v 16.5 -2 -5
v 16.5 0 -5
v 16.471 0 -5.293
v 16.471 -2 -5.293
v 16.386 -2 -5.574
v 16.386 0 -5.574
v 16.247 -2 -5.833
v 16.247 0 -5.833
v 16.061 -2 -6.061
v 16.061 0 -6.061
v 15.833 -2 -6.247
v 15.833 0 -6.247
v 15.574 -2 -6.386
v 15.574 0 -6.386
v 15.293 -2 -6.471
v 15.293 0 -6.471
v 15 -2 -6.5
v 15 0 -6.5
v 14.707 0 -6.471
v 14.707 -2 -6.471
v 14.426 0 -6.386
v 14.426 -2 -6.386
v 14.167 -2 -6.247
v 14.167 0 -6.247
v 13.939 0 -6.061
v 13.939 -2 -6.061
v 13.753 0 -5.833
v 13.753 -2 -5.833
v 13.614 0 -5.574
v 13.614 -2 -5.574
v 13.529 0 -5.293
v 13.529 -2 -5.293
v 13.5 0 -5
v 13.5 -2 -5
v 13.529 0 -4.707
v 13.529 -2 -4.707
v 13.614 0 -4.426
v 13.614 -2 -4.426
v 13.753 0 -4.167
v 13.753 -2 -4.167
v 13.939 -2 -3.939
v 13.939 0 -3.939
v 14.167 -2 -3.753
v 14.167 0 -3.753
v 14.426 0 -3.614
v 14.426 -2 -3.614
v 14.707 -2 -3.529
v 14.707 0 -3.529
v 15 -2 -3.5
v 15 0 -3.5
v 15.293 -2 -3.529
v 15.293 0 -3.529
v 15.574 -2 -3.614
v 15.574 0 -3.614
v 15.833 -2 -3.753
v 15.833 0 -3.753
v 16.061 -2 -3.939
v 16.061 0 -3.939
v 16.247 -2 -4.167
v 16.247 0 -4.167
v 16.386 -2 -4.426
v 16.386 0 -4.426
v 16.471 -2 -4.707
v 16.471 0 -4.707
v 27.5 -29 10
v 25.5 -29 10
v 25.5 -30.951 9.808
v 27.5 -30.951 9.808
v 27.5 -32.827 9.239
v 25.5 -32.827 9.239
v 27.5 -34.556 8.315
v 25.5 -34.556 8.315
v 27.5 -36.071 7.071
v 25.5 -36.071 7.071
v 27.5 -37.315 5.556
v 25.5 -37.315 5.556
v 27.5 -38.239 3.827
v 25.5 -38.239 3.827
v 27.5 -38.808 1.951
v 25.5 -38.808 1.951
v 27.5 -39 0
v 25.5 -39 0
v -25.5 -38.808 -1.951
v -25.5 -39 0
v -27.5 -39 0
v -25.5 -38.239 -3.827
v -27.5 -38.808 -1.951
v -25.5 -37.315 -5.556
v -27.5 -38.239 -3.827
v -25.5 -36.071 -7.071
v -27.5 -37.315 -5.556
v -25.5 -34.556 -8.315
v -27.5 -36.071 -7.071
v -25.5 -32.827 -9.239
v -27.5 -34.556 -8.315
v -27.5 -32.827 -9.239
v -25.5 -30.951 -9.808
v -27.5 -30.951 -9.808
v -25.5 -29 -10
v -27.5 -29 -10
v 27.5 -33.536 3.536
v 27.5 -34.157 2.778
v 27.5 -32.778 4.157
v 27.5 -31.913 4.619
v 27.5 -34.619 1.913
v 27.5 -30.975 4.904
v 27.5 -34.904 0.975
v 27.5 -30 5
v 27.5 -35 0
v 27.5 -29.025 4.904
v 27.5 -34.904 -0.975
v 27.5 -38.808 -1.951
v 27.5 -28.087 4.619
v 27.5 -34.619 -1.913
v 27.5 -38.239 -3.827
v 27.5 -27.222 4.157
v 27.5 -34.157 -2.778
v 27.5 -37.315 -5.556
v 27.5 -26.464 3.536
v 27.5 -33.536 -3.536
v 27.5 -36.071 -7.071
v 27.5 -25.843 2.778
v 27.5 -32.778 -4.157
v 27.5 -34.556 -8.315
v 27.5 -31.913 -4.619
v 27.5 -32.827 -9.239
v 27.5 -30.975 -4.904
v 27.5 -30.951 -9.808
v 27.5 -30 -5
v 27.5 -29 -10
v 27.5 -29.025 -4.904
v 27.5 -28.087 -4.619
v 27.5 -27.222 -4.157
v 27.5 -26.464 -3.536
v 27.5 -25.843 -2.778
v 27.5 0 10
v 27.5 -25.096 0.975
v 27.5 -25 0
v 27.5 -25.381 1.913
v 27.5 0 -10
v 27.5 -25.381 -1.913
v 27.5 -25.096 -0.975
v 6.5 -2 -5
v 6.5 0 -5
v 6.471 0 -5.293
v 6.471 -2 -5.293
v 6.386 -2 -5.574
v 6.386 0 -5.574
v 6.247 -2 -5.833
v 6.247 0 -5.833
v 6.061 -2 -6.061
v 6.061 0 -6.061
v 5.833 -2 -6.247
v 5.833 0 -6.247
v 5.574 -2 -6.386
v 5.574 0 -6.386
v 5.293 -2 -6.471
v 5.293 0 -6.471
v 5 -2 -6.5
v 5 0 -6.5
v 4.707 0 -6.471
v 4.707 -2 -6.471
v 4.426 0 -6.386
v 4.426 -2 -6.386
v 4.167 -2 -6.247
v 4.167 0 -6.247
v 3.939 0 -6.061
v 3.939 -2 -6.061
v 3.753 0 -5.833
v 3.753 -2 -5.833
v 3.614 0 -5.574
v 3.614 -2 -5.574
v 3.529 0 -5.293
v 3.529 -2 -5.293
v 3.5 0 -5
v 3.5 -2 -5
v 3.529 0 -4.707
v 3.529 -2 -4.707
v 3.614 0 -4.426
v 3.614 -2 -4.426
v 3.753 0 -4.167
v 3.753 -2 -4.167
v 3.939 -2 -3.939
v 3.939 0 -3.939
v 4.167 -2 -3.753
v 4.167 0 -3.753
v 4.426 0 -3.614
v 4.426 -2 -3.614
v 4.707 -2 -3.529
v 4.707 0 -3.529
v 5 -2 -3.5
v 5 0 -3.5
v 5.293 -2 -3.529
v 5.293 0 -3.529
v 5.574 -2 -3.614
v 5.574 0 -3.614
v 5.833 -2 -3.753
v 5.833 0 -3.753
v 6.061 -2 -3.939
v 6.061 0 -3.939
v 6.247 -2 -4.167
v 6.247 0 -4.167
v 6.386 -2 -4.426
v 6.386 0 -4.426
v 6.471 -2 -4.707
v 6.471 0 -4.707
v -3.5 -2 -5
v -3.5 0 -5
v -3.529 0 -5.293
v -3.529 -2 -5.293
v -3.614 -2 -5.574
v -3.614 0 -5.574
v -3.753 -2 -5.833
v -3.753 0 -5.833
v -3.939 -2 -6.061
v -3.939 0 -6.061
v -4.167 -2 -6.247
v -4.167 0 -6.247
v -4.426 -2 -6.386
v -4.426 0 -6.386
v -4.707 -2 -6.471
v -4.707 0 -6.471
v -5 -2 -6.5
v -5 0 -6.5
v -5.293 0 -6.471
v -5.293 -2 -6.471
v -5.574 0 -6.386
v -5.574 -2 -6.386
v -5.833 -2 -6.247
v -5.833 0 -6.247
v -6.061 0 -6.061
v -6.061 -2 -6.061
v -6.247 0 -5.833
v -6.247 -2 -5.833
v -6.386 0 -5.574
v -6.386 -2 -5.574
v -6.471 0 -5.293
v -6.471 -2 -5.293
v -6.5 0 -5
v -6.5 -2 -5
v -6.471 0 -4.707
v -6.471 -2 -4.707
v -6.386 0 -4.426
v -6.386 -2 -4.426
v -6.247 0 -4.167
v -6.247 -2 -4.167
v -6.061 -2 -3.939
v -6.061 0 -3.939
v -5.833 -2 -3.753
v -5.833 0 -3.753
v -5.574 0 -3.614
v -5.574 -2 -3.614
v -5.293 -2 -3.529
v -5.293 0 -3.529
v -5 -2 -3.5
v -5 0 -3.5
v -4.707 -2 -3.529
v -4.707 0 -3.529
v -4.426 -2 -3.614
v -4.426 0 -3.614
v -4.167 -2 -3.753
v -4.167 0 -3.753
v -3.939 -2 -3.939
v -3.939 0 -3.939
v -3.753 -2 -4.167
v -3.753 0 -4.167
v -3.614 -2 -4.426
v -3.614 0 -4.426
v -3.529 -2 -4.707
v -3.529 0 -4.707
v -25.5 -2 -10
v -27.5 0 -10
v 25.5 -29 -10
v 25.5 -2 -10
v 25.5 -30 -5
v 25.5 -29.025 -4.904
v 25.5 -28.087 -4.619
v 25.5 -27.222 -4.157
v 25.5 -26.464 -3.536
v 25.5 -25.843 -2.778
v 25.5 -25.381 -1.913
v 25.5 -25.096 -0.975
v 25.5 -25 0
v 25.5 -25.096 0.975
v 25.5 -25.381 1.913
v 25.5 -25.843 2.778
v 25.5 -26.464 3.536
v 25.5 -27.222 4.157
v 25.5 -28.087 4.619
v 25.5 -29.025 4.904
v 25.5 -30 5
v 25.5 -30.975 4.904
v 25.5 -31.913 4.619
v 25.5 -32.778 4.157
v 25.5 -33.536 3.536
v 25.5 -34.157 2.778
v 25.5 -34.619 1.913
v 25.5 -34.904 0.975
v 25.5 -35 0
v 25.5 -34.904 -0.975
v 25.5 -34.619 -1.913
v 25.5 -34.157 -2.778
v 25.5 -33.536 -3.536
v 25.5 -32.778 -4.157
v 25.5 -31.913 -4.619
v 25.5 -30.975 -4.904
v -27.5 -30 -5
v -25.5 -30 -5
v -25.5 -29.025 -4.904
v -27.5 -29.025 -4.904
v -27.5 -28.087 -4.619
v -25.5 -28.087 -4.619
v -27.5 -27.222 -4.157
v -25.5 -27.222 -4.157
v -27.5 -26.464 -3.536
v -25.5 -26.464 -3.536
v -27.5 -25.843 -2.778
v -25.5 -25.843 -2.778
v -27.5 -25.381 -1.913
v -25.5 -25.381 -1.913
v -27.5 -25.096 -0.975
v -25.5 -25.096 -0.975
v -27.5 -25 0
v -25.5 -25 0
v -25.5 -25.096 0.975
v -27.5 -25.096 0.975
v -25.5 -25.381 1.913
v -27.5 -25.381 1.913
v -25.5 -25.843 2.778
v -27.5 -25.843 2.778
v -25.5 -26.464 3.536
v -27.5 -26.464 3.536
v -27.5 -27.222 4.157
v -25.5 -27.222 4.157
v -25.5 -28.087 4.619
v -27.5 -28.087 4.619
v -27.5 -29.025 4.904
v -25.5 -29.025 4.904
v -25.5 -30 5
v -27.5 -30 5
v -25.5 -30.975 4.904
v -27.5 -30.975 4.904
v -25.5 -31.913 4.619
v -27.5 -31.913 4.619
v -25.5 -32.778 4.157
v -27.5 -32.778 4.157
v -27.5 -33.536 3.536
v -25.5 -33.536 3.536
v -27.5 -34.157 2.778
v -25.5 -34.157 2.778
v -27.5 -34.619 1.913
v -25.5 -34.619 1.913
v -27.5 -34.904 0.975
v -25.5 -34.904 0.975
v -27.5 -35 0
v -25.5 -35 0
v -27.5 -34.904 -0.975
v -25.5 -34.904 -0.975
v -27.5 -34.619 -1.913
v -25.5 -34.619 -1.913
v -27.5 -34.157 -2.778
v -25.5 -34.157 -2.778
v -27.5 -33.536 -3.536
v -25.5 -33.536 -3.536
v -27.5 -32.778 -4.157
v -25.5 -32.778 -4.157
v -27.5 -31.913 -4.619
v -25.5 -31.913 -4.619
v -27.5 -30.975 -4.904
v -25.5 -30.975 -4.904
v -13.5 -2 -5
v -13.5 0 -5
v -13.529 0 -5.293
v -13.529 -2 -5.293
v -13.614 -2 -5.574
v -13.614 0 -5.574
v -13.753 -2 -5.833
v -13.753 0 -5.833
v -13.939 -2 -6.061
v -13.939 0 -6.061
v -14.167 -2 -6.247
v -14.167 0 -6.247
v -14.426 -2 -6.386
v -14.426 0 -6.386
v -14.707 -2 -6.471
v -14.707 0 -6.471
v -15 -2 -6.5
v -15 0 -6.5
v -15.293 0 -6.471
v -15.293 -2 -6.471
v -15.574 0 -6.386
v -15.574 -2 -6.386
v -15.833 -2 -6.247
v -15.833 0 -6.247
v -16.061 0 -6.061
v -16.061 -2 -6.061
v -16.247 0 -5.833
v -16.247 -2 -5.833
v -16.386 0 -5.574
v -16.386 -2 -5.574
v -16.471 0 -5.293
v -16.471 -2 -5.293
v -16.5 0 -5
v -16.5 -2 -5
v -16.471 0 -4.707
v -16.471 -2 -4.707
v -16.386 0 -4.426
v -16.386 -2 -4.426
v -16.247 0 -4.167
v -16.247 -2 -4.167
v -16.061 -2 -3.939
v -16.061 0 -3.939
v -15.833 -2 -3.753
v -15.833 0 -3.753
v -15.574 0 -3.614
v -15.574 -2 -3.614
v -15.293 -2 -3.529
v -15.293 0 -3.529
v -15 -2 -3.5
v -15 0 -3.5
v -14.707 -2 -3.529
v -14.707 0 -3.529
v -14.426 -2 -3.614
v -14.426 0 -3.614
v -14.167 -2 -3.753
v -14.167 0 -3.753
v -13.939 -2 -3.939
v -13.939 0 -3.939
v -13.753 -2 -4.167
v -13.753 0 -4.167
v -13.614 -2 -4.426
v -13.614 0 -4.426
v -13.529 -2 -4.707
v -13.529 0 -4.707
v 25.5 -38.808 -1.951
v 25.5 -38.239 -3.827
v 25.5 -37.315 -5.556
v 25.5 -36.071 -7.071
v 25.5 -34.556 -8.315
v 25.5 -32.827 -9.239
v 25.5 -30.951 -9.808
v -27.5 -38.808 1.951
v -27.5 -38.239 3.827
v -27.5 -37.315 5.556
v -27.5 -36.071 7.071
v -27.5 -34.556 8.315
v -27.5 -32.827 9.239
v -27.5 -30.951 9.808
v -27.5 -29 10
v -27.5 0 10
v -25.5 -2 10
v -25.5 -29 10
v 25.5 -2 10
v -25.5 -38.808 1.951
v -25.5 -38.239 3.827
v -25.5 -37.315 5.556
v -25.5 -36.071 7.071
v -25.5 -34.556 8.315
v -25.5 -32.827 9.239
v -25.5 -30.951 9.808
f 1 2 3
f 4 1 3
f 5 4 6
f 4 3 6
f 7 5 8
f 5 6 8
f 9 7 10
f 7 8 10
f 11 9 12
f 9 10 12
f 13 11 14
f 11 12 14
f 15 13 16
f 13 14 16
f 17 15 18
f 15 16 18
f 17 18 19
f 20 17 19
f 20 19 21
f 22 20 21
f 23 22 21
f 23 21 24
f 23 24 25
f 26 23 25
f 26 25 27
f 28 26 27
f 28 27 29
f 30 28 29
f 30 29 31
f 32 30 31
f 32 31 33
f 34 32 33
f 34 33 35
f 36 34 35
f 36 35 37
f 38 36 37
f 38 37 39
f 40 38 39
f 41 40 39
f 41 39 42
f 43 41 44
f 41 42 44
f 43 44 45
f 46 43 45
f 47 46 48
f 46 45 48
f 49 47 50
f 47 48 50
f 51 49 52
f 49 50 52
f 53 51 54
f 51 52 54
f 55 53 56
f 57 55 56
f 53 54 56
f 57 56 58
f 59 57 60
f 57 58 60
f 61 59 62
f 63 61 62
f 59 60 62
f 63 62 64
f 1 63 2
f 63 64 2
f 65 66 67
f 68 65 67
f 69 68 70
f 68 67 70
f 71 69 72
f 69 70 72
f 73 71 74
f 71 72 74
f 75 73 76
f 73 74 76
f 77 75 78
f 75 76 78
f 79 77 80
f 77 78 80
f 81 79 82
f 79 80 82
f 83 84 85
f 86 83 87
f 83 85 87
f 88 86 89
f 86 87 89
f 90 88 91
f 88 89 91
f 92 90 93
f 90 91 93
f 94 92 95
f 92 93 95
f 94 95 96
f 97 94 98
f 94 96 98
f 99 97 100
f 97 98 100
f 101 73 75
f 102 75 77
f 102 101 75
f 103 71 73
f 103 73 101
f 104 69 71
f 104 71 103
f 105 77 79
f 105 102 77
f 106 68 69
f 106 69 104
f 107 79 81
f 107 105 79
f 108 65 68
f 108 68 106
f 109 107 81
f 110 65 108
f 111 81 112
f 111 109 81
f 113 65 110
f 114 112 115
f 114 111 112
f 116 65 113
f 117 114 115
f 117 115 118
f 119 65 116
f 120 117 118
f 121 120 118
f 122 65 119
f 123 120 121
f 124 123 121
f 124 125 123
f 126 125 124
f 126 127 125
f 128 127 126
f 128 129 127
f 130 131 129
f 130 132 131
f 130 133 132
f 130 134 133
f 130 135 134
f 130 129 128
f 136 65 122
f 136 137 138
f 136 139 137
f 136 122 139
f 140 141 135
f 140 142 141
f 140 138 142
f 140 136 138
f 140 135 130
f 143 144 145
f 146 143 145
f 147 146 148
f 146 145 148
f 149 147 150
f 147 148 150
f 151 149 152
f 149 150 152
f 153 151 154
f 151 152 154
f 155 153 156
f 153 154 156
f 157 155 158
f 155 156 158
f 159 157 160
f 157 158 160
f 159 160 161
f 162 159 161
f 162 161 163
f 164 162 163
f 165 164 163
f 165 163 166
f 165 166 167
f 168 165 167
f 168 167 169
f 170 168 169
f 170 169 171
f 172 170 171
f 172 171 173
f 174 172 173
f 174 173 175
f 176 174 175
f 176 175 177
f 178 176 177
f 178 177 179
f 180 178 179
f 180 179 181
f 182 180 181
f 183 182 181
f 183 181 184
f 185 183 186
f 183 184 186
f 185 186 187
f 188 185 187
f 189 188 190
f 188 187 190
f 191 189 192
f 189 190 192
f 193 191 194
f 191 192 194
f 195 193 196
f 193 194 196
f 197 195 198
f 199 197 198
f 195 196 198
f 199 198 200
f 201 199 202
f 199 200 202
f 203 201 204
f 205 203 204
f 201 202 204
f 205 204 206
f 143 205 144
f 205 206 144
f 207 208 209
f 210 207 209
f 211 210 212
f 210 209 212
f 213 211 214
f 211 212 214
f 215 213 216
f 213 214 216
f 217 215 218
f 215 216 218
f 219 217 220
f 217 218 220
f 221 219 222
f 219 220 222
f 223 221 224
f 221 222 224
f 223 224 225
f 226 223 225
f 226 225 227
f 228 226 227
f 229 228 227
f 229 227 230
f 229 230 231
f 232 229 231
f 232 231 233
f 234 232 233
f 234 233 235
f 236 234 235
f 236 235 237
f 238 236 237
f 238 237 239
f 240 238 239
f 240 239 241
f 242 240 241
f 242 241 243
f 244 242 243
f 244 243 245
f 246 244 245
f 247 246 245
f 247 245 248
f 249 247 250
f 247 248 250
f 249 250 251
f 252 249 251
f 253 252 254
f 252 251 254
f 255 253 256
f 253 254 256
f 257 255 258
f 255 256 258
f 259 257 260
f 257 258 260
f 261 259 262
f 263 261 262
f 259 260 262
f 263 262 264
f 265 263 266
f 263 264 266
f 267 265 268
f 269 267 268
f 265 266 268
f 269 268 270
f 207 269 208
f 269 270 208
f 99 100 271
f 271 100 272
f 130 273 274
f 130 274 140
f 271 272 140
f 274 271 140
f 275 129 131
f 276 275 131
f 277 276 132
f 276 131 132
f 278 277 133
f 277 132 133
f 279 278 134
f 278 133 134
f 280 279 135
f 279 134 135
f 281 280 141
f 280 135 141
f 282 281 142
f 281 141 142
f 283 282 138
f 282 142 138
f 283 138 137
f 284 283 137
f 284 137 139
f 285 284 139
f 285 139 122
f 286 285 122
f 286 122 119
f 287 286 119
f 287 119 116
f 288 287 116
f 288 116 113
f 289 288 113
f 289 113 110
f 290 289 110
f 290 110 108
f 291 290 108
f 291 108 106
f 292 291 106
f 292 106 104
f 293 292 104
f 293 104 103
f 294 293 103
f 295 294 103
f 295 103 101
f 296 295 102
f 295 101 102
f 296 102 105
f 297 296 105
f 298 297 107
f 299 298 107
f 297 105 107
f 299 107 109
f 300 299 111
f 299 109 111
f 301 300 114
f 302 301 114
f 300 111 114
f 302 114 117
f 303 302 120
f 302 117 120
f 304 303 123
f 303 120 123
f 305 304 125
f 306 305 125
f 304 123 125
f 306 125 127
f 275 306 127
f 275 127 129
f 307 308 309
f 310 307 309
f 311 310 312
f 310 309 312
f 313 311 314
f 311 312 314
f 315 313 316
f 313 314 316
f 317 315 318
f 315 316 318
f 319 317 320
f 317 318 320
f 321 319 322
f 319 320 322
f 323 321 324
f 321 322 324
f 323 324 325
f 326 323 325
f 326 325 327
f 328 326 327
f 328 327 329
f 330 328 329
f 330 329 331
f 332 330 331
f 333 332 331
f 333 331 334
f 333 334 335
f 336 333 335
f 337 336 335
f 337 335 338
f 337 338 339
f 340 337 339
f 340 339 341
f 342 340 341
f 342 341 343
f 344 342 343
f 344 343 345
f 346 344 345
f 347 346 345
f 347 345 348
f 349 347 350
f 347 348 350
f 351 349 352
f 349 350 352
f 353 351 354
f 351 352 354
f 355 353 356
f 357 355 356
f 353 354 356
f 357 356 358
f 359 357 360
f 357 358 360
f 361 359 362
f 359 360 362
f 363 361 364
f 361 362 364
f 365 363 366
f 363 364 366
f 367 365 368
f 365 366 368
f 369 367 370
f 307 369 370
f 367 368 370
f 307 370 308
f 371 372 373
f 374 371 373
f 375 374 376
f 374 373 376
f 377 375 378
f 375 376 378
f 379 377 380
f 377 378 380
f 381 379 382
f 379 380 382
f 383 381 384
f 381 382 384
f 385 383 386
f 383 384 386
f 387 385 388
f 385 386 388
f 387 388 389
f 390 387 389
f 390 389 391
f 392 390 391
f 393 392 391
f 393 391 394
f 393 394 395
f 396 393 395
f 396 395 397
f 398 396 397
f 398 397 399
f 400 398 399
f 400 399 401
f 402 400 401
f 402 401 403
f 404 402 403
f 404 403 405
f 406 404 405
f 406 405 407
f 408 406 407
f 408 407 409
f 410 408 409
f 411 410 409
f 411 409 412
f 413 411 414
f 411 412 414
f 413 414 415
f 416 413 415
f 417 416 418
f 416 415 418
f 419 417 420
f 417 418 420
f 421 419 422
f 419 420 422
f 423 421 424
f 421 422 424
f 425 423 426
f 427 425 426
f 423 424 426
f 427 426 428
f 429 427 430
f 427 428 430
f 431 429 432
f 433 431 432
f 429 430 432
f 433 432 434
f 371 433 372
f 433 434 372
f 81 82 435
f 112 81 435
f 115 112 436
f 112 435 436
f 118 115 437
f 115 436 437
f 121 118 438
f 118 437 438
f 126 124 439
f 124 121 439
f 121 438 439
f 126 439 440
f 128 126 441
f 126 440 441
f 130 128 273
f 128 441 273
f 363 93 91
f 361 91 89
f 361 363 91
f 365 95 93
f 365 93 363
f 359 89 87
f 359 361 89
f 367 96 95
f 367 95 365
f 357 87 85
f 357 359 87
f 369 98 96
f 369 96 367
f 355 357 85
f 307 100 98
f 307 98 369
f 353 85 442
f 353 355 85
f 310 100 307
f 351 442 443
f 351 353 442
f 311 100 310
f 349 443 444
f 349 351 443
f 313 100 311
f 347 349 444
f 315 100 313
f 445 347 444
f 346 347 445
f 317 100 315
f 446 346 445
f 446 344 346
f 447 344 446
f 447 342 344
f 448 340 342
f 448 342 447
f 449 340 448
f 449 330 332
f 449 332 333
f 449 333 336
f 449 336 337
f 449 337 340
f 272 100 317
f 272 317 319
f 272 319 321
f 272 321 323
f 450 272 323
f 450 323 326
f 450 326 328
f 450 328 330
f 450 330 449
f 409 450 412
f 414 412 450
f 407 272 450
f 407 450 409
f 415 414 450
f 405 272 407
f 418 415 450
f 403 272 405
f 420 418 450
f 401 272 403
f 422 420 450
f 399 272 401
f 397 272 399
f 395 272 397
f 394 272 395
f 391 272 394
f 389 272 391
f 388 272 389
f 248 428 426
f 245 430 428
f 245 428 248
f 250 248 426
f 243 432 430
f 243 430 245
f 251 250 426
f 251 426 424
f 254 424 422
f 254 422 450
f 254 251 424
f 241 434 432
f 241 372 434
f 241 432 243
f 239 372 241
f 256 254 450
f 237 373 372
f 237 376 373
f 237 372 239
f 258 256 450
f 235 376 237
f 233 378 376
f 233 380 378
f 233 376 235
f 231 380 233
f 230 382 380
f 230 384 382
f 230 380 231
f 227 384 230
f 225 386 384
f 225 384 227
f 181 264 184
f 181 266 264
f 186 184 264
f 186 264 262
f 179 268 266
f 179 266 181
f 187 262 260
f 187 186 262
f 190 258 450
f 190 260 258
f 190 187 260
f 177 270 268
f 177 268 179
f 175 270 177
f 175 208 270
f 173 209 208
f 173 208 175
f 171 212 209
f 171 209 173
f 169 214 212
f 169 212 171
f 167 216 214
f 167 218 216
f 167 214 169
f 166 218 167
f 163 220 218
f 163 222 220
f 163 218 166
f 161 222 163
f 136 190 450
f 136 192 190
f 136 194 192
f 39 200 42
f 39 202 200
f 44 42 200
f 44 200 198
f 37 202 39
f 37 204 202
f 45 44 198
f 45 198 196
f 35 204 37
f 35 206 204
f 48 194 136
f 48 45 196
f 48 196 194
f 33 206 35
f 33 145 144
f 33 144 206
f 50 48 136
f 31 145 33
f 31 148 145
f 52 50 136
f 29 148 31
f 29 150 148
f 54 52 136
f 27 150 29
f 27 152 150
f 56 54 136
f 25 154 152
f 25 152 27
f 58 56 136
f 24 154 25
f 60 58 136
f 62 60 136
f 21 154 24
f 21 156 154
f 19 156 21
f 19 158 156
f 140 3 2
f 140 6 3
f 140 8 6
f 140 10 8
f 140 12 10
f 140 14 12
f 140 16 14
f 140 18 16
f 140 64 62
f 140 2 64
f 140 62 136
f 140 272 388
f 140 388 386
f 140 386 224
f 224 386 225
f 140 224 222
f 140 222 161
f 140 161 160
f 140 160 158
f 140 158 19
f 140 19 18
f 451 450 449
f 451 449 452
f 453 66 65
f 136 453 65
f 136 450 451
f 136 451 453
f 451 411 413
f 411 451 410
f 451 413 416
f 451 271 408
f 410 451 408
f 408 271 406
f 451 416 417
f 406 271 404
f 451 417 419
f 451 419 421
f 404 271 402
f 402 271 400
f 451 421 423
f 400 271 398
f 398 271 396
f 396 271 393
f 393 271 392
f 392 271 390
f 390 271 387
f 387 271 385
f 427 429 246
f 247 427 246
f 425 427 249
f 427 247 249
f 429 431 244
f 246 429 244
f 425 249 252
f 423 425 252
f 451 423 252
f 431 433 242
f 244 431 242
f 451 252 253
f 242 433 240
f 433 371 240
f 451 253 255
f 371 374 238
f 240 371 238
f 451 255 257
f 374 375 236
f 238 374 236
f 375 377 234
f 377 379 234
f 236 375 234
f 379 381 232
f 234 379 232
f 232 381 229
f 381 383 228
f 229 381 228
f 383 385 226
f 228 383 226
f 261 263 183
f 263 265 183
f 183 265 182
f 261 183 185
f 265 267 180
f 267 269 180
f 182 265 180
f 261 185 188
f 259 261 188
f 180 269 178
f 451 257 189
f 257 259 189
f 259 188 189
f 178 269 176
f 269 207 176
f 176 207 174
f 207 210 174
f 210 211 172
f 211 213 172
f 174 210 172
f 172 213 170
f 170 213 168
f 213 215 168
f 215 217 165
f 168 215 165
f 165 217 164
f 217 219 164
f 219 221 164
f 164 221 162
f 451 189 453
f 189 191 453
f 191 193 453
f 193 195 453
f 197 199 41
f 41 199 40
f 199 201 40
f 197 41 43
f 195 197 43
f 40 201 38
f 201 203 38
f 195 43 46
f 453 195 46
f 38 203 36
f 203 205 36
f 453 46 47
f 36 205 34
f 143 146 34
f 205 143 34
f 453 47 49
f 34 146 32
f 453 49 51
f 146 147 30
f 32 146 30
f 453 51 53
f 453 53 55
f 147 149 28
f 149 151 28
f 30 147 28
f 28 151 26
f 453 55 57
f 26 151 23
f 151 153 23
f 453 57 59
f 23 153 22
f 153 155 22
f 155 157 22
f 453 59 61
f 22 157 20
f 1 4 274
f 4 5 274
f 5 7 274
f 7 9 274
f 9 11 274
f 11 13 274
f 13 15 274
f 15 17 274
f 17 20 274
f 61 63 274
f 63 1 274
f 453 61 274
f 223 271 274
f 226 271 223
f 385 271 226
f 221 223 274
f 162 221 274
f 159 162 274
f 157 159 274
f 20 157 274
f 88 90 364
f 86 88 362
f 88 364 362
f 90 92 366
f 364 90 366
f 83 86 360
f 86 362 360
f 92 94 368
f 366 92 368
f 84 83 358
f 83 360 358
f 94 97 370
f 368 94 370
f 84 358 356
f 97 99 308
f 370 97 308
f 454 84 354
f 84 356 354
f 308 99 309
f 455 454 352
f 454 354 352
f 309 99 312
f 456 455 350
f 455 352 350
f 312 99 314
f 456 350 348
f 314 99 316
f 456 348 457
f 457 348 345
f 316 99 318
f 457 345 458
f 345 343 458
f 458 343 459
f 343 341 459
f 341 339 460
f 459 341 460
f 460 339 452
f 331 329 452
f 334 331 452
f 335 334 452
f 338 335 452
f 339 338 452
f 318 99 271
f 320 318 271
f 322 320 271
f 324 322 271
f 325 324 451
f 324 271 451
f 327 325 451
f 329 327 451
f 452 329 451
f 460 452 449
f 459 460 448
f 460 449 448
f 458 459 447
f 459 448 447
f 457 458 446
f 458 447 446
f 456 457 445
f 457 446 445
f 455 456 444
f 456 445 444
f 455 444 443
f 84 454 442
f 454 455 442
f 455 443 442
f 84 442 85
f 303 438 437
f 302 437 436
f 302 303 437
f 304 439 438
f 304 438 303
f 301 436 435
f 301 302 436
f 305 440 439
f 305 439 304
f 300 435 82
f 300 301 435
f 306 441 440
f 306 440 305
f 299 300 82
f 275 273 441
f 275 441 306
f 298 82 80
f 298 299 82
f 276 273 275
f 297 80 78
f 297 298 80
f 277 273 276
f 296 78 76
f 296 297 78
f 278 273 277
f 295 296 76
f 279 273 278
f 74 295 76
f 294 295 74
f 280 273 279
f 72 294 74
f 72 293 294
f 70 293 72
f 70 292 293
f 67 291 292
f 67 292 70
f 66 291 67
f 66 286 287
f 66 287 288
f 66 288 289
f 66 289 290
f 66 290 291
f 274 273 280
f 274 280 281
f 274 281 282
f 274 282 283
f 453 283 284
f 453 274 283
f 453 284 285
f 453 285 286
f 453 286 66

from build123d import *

# Parameters (mm, degrees)
SKETCH1_W           = 55
SKETCH1_H           = 20
BOSS_EXTRUDE1_DEPTH = 2
SKETCH2_W           = 2
SKETCH2_H           = 20
BOSS_EXTRUDE2_DEPTH = 37
SKETCH3_R           = 5
CUT_EXTRUDE1_DEPTH  = 56
CUT_EXTRUDE2_DEPTH  = 56
SKETCH5_R           = 1.5
CUT_EXTRUDE3_DEPTH  = 40


with BuildPart() as part:
    # Sketch1 → Boss-Extrude1 (new body)
    with BuildSketch(Plane(origin=(0, 0, 0), x_dir=(1, 0, 0), z_dir=(0, 1, 0))):
        Rectangle(SKETCH1_W, SKETCH1_H)
    extrude(amount=-BOSS_EXTRUDE1_DEPTH)

    # Sketch2 → Boss-Extrude2 (add)
    with BuildSketch(Plane.XZ.offset(2)):
        with Locations((-26.5, 0)):
            Rectangle(SKETCH2_W, SKETCH2_H)
        with Locations((26.5, 0)):
            Rectangle(SKETCH2_W, SKETCH2_H)
    extrude(amount=BOSS_EXTRUDE2_DEPTH)

    # Sketch3 → Cut-Extrude1 (cut, through all)
    with BuildSketch(Plane(origin=(27.5, 0, 0), x_dir=(0, 0, -1), z_dir=(1, 0, 0))):
        with Locations((0, -30)):
            Circle(SKETCH3_R)
    extrude(amount=-CUT_EXTRUDE1_DEPTH, mode=Mode.SUBTRACT)

    # Sketch4 → Cut-Extrude2 (cut, through all)
    with BuildSketch(Plane.ZY.offset(27.5)):
        with BuildLine():
            ThreePointArc((0, -39), (-7.071067812, -36.071067812), (-10, -29))
            Line((-10, -29), (-10, -39))
            Line((-10, -39), (0, -39))
        make_face()
        with BuildLine():
            Line((10, -39), (10, -29))
            ThreePointArc((10, -29), (7.071067812, -36.071067812), (0, -39))
            Line((0, -39), (10, -39))
        make_face()
    extrude(amount=-CUT_EXTRUDE2_DEPTH, mode=Mode.SUBTRACT)

    # Sketch5 → Cut-Extrude3 (cut, through all)
    with BuildSketch(Plane(origin=(0, 0, 0), x_dir=(1, 0, 0), z_dir=(0, 1, 0))):
        with Locations((5, 5)):
            Circle(SKETCH5_R)
        with Locations((15, 5)):
            Circle(SKETCH5_R)
        with Locations((-15, 5)):
            Circle(SKETCH5_R)
        with Locations((-5, 5)):
            Circle(SKETCH5_R)
    extrude(amount=-CUT_EXTRUDE3_DEPTH, mode=Mode.SUBTRACT)


solid = part.part
